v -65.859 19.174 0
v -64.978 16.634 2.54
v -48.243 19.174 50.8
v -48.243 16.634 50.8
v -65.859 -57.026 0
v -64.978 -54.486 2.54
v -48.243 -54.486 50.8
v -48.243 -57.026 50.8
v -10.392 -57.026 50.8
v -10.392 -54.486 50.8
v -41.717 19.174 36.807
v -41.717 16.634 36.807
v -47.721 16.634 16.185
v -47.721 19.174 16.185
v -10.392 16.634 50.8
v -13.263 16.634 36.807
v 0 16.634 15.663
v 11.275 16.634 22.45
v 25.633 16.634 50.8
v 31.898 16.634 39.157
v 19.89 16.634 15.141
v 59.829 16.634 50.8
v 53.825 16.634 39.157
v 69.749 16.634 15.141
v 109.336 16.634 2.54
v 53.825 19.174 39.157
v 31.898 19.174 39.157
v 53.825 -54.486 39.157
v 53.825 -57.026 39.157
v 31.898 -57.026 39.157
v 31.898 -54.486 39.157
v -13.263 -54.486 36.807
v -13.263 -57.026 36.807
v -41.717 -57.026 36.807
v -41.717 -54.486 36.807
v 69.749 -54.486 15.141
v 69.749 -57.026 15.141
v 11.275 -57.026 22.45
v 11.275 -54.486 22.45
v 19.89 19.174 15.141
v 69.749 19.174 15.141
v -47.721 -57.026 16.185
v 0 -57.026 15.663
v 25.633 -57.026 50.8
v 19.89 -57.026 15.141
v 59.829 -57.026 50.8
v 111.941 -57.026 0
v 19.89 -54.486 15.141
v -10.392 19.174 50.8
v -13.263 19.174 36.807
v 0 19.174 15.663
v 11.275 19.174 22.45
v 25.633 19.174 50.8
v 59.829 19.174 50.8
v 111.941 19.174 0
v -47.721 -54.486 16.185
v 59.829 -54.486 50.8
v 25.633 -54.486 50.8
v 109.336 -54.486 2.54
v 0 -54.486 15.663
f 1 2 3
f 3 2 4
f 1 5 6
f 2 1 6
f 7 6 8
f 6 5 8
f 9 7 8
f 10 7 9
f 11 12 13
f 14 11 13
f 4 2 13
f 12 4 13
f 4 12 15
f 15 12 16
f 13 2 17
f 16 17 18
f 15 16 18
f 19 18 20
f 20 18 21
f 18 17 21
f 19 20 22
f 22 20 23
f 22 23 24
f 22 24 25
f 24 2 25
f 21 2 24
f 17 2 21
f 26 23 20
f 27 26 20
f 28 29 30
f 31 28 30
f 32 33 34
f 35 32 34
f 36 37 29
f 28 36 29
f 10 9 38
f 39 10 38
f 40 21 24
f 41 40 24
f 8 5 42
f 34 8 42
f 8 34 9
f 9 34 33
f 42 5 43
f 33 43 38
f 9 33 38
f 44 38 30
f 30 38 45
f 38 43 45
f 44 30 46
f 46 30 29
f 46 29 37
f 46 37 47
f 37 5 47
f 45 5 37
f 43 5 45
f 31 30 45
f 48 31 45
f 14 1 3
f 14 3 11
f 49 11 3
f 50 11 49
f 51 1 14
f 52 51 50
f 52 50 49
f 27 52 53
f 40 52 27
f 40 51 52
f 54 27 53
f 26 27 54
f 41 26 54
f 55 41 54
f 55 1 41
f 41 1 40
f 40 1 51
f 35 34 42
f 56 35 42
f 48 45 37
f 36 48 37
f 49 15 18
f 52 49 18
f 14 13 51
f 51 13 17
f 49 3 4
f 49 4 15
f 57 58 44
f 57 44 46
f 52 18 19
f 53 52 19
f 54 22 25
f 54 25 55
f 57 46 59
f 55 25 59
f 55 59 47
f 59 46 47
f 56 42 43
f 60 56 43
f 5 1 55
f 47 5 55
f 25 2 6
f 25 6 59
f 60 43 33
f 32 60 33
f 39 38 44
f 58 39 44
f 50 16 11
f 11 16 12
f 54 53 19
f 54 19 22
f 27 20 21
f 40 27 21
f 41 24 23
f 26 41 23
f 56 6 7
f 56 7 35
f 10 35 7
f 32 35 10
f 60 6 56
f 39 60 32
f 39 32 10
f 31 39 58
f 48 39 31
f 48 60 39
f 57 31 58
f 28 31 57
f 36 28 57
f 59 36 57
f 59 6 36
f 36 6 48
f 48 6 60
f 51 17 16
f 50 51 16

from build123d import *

# Parameters (mm, degrees)
F0_W     = 177.8
F0_H     = 76.2
F1_DEPTH = 50.8
F2_T     = -2.54
F4_DEPTH = 76.201
F6_DEPTH = 76.201
F8_DEPTH = 76.201


with BuildPart() as f1:
    # F0 (on Top) → F1 (new body)
    with BuildSketch(Plane.XY):
        with Locations((23.041371, -18.925695)):
            Rectangle(F0_W, F0_H)
    extrude(amount=F1_DEPTH)

    # F2
    f2_openings = [f1.faces().sort_by_distance(p)[0] for p in [
        (23.041371, -18.925695, 50.8),
        (-65.858629, -18.925695, 25.4),
        (111.941371, -18.925695, 25.4),
    ]]
    offset(amount=F2_T, openings=f2_openings)

    # F3 (on face) → F4 (cut, through all)
    with BuildSketch(Plane.XZ.offset(57.025695)):
        Polygon((-74.445255, 69.43772), (-65.858629, 0), (-48.242956, 50.8), (-10.39157, 50.8), (11.275085, 22.44979), (25.632508, 50.8), (59.82928, 50.8), (111.941371, 0), (111.941371, 69.43772), align=None)
    extrude(amount=-F4_DEPTH, mode=Mode.SUBTRACT)

    # F5 (on face) → F6 (cut, through all)
    with BuildSketch(Plane.XZ.offset(57.025695)):
        Polygon((-41.716851, 36.807209), (-47.720864, 16.18473), (0, 15.662642), (-13.263052, 36.807209), align=None)
    extrude(amount=-F6_DEPTH, mode=Mode.SUBTRACT)

    # F7 (on face) → F8 (cut, through all)
    with BuildSketch(Plane.XZ.offset(57.025695)):
        Polygon((31.897567, 39.156608), (19.889543, 15.140554), (69.74896, 15.140554), (53.82527, 39.156608), align=None)
    extrude(amount=-F8_DEPTH, mode=Mode.SUBTRACT)


solid = f1.part
